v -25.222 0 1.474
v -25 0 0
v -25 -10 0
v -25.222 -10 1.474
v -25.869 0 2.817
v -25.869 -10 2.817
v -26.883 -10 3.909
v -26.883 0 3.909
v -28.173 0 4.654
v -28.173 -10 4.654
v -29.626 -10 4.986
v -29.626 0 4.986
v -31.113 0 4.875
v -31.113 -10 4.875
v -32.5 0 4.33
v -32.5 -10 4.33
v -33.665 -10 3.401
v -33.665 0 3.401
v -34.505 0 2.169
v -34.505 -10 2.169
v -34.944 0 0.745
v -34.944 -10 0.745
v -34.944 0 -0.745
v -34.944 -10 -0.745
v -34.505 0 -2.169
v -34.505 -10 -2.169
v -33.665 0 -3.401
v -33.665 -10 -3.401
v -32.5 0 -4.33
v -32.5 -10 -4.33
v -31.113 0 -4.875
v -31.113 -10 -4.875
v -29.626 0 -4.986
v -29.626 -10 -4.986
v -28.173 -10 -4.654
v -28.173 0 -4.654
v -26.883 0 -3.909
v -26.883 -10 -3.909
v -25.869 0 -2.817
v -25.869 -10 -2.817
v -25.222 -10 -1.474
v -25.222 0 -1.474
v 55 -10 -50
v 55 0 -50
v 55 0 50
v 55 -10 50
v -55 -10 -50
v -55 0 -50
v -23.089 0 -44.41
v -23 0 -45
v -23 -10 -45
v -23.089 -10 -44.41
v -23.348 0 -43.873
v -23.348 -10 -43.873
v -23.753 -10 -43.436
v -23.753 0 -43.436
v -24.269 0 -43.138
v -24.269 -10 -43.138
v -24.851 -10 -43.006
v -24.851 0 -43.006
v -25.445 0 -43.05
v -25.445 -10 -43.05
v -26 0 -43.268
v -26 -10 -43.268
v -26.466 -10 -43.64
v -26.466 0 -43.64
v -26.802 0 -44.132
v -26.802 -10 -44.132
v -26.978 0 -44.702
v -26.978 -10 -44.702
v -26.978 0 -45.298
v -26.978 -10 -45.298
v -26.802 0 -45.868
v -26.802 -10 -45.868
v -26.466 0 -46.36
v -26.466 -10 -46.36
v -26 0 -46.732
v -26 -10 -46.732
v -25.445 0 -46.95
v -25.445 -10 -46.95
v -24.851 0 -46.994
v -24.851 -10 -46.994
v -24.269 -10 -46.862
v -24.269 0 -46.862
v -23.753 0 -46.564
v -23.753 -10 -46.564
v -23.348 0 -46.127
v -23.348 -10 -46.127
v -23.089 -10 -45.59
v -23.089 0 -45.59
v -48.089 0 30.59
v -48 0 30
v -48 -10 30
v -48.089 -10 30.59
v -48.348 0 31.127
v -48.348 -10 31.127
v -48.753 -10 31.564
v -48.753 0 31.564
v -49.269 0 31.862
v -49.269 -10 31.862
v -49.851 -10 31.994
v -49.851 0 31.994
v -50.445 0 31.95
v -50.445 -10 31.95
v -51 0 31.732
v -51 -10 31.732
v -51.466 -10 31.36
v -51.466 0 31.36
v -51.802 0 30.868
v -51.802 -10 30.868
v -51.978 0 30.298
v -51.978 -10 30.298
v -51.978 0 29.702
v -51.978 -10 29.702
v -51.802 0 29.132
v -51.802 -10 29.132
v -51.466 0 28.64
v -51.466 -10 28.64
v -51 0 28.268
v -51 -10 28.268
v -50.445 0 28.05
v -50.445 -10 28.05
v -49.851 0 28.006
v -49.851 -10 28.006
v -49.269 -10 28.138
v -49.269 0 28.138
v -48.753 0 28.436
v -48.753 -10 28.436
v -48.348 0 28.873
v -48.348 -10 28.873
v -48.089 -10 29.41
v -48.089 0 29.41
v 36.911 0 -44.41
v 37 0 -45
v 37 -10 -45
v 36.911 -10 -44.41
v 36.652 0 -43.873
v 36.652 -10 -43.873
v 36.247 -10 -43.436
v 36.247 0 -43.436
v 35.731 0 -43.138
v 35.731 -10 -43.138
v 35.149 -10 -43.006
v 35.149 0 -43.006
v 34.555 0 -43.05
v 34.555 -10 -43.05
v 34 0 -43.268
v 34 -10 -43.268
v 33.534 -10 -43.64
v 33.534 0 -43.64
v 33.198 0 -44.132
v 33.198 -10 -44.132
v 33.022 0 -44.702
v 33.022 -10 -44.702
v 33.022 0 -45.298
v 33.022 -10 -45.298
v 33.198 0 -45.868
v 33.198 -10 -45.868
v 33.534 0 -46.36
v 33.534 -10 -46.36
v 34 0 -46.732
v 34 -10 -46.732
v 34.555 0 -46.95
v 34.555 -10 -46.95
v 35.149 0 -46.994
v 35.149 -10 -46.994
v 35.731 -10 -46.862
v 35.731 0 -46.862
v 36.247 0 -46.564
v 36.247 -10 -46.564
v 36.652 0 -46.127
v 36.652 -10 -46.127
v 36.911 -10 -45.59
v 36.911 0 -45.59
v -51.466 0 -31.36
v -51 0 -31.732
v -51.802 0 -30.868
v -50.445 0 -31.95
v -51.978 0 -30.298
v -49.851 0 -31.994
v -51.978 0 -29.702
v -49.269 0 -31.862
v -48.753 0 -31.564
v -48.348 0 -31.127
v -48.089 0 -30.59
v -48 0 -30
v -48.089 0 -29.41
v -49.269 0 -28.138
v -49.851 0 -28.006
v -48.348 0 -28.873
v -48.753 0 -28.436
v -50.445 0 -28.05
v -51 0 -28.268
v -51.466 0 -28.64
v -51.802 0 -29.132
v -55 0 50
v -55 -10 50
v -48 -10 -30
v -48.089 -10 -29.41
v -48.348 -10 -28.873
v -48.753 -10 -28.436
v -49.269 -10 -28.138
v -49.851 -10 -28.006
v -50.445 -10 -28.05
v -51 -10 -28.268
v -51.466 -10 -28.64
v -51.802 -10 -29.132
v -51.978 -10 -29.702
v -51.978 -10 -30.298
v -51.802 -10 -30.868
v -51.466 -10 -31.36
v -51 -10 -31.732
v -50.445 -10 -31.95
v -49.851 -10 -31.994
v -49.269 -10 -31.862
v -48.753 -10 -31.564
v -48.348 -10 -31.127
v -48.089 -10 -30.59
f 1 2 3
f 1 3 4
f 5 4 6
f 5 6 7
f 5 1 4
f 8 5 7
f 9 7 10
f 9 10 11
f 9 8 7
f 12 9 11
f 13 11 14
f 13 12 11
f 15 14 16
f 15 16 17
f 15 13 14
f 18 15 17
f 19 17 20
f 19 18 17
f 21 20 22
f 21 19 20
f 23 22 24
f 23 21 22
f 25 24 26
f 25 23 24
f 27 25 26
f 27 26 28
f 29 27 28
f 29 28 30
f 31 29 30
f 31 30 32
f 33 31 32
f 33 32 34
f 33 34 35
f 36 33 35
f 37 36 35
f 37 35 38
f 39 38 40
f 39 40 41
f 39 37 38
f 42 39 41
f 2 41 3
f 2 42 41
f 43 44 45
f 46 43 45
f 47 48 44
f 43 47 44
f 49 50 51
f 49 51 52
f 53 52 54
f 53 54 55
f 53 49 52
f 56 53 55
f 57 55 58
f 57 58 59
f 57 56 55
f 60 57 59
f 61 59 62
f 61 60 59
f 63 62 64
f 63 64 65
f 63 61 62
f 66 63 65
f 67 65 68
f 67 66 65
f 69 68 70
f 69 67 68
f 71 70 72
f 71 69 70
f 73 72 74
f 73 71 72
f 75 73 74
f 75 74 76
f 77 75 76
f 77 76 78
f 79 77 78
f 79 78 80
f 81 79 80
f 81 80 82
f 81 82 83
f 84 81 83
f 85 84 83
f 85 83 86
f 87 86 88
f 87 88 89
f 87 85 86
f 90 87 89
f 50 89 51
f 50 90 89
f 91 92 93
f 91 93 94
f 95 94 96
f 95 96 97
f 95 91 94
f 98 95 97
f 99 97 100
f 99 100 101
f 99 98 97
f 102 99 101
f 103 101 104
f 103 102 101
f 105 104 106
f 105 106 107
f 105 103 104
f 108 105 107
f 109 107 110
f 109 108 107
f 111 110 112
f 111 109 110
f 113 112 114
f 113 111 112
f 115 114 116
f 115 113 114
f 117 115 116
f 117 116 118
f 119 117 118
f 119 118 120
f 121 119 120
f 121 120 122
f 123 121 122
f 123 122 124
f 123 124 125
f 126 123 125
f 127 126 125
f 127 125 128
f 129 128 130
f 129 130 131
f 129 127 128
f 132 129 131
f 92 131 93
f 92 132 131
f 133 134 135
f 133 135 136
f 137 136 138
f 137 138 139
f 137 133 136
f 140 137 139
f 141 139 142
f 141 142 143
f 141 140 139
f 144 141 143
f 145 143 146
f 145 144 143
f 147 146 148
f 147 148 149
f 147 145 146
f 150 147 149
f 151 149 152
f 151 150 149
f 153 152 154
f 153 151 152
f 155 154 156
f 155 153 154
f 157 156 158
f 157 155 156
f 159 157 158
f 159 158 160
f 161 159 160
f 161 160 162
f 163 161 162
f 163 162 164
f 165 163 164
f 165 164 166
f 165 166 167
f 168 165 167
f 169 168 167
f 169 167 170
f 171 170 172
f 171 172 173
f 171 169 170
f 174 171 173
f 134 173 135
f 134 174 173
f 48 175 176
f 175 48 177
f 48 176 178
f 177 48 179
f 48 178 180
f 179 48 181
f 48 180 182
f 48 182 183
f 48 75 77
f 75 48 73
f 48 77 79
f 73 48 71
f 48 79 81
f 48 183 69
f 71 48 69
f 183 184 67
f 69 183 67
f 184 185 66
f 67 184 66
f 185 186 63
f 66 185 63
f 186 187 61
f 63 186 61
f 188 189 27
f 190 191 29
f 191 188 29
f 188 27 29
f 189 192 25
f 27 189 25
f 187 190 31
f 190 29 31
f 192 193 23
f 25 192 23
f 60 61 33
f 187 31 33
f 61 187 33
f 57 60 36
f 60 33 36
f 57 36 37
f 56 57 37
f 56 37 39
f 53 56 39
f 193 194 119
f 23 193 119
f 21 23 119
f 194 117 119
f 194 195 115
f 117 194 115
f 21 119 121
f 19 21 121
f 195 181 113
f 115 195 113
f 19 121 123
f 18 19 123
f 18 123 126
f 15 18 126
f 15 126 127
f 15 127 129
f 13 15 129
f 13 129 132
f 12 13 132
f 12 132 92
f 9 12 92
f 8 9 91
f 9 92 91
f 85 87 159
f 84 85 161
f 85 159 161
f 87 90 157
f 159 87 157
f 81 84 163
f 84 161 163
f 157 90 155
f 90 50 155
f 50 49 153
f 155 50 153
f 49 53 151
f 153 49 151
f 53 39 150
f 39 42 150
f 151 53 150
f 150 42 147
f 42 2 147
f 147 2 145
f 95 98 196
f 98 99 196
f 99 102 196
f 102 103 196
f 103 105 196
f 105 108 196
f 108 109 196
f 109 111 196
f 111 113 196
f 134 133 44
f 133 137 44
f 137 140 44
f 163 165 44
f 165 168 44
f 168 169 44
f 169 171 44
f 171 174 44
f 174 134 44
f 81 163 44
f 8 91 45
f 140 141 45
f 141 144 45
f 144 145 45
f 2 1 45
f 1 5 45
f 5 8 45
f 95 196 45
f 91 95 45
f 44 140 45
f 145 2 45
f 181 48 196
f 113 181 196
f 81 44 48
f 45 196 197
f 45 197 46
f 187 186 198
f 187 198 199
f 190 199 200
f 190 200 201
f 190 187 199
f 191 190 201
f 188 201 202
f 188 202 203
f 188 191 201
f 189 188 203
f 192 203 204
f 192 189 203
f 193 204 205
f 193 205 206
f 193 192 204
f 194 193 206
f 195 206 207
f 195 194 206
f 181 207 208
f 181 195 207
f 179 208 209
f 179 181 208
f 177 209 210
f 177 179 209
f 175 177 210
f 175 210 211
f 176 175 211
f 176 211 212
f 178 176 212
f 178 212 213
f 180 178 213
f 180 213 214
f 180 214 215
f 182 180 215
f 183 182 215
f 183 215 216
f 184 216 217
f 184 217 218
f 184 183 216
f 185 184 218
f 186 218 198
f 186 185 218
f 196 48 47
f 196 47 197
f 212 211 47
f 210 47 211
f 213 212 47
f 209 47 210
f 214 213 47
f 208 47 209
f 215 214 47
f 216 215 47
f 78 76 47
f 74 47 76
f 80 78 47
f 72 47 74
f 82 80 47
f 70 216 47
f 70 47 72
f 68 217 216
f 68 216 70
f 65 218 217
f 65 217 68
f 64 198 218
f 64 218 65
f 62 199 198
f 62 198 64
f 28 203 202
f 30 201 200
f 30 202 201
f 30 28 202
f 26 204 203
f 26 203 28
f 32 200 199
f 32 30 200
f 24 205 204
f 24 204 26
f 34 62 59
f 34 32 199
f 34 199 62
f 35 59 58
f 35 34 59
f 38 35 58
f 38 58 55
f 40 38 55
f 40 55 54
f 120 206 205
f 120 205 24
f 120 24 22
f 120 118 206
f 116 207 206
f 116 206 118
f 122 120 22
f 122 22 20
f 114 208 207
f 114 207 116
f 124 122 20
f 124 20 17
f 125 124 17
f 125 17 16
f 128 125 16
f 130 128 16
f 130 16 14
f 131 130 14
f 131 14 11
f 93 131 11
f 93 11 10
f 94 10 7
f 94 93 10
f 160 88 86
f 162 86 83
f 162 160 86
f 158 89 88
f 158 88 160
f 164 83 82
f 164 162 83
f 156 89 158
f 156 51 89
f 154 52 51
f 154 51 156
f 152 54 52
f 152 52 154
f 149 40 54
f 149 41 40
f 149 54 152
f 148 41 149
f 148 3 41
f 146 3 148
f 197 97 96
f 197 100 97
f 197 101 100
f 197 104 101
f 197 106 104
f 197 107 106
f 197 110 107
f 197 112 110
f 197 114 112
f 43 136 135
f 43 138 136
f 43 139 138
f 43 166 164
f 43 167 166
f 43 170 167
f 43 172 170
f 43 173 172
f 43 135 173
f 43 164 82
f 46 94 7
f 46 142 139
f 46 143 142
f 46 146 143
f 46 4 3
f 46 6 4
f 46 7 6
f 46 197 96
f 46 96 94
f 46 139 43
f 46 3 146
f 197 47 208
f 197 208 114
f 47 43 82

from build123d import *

# Parameters (mm, degrees)
F0_W     = 110
F0_H     = 100
F0_R     = 2
F0_R_2   = 5
F1_DEPTH = 10


with BuildPart() as f1:
    # F0 (on Front) → F1 (new body)
    with BuildSketch(Plane.XZ):
        Rectangle(F0_W, F0_H)
        with Locations((-50, -30)):
            Circle(F0_R, mode=Mode.SUBTRACT)
        with Locations((-25, -45)):
            Circle(F0_R, mode=Mode.SUBTRACT)
        with Locations((35, -45)):
            Circle(F0_R, mode=Mode.SUBTRACT)
        with Locations((-30, 0)):
            Circle(F0_R_2, mode=Mode.SUBTRACT)
        with Locations((-50, 30)):
            Circle(F0_R, mode=Mode.SUBTRACT)
    extrude(amount=F1_DEPTH)


solid = f1.part
